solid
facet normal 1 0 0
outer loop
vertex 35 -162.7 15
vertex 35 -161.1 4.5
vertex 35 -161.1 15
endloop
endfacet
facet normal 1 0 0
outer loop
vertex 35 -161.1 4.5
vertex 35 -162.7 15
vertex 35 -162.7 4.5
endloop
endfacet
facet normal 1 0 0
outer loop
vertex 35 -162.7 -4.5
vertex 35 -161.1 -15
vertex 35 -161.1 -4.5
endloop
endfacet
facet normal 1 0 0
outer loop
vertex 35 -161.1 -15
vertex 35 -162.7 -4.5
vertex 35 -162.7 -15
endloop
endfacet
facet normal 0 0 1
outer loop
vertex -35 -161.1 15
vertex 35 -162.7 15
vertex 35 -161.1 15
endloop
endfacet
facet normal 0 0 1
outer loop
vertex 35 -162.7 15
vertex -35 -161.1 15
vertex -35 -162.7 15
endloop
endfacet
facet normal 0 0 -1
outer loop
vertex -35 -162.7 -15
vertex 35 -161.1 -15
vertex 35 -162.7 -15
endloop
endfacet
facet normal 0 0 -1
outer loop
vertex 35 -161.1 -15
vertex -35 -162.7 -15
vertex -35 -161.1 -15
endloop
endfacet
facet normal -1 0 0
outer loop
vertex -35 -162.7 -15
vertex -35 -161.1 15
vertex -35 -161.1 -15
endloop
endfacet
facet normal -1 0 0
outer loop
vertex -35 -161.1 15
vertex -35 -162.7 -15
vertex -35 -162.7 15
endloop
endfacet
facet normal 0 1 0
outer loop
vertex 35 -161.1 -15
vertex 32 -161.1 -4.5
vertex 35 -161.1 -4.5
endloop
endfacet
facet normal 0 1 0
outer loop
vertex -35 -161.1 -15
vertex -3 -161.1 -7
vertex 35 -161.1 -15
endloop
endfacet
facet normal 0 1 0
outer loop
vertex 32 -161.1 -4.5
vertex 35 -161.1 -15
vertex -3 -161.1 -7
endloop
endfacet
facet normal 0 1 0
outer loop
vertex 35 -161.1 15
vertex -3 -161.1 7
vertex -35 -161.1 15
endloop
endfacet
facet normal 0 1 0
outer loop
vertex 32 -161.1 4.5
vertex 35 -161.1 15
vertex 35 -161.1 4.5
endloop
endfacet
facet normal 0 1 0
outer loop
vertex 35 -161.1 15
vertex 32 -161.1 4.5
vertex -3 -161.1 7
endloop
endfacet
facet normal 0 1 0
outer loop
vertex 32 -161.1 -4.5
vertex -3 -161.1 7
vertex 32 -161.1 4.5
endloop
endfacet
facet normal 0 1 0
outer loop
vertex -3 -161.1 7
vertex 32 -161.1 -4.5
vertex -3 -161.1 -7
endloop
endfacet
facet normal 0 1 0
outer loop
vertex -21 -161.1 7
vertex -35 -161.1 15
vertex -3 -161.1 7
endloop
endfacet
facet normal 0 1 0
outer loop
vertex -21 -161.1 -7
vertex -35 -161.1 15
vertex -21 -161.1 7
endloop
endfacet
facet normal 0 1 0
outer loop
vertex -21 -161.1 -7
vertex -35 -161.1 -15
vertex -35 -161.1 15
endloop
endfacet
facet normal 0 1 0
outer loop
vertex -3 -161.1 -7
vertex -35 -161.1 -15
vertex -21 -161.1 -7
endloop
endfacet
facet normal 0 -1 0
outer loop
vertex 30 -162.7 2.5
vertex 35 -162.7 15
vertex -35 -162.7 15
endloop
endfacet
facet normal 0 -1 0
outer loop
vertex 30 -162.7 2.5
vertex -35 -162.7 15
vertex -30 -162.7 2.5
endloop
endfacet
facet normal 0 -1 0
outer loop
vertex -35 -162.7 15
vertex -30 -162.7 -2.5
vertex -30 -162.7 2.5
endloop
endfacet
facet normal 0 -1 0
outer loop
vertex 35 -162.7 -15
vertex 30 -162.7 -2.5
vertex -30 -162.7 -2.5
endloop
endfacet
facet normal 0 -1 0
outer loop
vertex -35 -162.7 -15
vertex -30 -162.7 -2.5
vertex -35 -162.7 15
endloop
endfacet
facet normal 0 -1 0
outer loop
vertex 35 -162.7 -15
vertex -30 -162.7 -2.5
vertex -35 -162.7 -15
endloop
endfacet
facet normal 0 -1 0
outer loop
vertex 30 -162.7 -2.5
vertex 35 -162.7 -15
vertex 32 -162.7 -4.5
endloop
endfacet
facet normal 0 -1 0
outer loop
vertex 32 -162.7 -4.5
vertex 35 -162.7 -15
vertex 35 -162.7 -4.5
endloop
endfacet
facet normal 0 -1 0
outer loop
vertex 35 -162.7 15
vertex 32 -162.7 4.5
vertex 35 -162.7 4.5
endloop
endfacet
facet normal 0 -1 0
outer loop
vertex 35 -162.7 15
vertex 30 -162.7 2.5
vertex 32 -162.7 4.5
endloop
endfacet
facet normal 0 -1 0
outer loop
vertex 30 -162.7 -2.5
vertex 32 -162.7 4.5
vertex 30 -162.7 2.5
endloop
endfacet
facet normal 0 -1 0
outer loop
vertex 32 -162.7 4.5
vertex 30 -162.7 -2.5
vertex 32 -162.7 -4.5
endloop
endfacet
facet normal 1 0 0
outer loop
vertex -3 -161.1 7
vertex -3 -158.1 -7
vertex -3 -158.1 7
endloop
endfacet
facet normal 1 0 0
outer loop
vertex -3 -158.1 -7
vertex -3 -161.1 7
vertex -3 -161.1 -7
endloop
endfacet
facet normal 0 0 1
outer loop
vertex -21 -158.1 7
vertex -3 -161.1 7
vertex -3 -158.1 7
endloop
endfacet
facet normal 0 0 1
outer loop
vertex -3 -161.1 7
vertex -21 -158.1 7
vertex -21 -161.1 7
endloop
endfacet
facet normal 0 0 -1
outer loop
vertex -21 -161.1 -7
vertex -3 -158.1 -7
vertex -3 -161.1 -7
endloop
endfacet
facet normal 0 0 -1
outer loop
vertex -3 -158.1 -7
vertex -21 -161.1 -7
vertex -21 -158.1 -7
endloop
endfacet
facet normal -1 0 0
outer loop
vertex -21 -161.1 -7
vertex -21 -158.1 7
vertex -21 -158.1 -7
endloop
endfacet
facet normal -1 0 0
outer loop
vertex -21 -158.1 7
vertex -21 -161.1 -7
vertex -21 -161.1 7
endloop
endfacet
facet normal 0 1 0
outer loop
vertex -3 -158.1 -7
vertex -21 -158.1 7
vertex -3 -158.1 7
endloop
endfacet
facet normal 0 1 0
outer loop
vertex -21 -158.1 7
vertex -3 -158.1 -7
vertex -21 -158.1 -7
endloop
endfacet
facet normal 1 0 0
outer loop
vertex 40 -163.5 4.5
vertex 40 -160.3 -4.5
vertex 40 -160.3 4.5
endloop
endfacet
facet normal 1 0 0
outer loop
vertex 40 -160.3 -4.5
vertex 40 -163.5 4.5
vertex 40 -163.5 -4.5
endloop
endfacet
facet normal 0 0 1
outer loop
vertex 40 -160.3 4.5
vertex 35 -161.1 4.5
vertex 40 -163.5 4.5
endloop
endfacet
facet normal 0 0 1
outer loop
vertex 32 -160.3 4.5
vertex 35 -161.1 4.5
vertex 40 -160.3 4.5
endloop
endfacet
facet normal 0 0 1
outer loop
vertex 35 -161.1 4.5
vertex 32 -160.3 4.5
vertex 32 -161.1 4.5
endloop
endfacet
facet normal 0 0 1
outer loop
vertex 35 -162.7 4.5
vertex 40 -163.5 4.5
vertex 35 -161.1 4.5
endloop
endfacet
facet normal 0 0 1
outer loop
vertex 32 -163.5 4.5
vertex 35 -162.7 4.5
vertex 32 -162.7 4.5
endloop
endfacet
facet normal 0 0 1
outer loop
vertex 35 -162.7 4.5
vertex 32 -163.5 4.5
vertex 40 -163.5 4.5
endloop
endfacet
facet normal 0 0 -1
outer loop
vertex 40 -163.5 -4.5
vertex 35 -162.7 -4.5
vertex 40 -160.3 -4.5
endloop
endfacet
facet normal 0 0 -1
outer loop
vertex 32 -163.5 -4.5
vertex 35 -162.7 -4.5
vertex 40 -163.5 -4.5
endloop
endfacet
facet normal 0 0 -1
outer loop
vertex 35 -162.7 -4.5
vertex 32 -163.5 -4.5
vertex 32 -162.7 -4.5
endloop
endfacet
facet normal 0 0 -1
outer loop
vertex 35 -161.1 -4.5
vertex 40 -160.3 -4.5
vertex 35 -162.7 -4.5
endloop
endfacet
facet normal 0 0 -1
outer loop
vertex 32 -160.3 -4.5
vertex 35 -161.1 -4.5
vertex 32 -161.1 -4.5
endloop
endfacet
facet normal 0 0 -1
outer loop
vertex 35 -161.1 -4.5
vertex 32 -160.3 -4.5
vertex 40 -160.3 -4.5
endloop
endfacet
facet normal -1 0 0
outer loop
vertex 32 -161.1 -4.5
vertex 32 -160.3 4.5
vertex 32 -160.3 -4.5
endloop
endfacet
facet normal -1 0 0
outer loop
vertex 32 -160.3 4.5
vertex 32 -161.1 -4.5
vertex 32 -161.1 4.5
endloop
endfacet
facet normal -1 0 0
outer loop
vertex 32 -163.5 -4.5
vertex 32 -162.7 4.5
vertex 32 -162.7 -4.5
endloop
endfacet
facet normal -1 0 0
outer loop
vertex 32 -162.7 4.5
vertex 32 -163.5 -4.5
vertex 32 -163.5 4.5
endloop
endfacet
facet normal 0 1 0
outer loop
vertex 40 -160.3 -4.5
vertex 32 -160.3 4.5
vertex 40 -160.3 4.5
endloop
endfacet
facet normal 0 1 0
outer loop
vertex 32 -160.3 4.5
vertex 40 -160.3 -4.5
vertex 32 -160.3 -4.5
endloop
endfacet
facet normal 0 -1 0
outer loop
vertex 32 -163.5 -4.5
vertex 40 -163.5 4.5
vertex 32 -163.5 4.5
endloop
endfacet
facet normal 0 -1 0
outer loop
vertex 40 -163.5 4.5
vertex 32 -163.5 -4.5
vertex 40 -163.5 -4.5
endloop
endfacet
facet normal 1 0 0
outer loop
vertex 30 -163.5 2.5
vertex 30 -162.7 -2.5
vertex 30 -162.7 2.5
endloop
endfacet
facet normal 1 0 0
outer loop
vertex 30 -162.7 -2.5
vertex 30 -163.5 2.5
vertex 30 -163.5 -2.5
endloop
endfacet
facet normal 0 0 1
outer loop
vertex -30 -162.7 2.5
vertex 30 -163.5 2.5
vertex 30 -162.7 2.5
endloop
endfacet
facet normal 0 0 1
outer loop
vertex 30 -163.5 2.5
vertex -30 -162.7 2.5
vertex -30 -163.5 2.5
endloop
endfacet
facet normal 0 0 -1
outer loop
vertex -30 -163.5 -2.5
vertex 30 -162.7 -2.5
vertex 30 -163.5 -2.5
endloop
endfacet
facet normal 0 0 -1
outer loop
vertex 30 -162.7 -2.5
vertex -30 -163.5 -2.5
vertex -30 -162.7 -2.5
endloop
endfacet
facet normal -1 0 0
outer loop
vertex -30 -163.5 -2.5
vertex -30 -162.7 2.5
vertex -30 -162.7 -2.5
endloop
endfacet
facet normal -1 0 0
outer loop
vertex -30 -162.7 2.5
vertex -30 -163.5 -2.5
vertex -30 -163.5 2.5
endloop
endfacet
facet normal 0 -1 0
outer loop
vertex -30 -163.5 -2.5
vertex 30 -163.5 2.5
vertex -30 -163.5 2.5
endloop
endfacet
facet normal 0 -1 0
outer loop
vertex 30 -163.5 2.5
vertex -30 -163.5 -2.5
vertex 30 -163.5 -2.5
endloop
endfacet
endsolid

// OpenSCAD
// Reference target: the flat, rigid PCB (board + USB-C + module + LED bar).
// Not printed — it defines the flat parting plane the shells are built around.
//   openscad -o ../stl/pcb.stl pcb.scad
include <enclosure.scad>
pcb();
